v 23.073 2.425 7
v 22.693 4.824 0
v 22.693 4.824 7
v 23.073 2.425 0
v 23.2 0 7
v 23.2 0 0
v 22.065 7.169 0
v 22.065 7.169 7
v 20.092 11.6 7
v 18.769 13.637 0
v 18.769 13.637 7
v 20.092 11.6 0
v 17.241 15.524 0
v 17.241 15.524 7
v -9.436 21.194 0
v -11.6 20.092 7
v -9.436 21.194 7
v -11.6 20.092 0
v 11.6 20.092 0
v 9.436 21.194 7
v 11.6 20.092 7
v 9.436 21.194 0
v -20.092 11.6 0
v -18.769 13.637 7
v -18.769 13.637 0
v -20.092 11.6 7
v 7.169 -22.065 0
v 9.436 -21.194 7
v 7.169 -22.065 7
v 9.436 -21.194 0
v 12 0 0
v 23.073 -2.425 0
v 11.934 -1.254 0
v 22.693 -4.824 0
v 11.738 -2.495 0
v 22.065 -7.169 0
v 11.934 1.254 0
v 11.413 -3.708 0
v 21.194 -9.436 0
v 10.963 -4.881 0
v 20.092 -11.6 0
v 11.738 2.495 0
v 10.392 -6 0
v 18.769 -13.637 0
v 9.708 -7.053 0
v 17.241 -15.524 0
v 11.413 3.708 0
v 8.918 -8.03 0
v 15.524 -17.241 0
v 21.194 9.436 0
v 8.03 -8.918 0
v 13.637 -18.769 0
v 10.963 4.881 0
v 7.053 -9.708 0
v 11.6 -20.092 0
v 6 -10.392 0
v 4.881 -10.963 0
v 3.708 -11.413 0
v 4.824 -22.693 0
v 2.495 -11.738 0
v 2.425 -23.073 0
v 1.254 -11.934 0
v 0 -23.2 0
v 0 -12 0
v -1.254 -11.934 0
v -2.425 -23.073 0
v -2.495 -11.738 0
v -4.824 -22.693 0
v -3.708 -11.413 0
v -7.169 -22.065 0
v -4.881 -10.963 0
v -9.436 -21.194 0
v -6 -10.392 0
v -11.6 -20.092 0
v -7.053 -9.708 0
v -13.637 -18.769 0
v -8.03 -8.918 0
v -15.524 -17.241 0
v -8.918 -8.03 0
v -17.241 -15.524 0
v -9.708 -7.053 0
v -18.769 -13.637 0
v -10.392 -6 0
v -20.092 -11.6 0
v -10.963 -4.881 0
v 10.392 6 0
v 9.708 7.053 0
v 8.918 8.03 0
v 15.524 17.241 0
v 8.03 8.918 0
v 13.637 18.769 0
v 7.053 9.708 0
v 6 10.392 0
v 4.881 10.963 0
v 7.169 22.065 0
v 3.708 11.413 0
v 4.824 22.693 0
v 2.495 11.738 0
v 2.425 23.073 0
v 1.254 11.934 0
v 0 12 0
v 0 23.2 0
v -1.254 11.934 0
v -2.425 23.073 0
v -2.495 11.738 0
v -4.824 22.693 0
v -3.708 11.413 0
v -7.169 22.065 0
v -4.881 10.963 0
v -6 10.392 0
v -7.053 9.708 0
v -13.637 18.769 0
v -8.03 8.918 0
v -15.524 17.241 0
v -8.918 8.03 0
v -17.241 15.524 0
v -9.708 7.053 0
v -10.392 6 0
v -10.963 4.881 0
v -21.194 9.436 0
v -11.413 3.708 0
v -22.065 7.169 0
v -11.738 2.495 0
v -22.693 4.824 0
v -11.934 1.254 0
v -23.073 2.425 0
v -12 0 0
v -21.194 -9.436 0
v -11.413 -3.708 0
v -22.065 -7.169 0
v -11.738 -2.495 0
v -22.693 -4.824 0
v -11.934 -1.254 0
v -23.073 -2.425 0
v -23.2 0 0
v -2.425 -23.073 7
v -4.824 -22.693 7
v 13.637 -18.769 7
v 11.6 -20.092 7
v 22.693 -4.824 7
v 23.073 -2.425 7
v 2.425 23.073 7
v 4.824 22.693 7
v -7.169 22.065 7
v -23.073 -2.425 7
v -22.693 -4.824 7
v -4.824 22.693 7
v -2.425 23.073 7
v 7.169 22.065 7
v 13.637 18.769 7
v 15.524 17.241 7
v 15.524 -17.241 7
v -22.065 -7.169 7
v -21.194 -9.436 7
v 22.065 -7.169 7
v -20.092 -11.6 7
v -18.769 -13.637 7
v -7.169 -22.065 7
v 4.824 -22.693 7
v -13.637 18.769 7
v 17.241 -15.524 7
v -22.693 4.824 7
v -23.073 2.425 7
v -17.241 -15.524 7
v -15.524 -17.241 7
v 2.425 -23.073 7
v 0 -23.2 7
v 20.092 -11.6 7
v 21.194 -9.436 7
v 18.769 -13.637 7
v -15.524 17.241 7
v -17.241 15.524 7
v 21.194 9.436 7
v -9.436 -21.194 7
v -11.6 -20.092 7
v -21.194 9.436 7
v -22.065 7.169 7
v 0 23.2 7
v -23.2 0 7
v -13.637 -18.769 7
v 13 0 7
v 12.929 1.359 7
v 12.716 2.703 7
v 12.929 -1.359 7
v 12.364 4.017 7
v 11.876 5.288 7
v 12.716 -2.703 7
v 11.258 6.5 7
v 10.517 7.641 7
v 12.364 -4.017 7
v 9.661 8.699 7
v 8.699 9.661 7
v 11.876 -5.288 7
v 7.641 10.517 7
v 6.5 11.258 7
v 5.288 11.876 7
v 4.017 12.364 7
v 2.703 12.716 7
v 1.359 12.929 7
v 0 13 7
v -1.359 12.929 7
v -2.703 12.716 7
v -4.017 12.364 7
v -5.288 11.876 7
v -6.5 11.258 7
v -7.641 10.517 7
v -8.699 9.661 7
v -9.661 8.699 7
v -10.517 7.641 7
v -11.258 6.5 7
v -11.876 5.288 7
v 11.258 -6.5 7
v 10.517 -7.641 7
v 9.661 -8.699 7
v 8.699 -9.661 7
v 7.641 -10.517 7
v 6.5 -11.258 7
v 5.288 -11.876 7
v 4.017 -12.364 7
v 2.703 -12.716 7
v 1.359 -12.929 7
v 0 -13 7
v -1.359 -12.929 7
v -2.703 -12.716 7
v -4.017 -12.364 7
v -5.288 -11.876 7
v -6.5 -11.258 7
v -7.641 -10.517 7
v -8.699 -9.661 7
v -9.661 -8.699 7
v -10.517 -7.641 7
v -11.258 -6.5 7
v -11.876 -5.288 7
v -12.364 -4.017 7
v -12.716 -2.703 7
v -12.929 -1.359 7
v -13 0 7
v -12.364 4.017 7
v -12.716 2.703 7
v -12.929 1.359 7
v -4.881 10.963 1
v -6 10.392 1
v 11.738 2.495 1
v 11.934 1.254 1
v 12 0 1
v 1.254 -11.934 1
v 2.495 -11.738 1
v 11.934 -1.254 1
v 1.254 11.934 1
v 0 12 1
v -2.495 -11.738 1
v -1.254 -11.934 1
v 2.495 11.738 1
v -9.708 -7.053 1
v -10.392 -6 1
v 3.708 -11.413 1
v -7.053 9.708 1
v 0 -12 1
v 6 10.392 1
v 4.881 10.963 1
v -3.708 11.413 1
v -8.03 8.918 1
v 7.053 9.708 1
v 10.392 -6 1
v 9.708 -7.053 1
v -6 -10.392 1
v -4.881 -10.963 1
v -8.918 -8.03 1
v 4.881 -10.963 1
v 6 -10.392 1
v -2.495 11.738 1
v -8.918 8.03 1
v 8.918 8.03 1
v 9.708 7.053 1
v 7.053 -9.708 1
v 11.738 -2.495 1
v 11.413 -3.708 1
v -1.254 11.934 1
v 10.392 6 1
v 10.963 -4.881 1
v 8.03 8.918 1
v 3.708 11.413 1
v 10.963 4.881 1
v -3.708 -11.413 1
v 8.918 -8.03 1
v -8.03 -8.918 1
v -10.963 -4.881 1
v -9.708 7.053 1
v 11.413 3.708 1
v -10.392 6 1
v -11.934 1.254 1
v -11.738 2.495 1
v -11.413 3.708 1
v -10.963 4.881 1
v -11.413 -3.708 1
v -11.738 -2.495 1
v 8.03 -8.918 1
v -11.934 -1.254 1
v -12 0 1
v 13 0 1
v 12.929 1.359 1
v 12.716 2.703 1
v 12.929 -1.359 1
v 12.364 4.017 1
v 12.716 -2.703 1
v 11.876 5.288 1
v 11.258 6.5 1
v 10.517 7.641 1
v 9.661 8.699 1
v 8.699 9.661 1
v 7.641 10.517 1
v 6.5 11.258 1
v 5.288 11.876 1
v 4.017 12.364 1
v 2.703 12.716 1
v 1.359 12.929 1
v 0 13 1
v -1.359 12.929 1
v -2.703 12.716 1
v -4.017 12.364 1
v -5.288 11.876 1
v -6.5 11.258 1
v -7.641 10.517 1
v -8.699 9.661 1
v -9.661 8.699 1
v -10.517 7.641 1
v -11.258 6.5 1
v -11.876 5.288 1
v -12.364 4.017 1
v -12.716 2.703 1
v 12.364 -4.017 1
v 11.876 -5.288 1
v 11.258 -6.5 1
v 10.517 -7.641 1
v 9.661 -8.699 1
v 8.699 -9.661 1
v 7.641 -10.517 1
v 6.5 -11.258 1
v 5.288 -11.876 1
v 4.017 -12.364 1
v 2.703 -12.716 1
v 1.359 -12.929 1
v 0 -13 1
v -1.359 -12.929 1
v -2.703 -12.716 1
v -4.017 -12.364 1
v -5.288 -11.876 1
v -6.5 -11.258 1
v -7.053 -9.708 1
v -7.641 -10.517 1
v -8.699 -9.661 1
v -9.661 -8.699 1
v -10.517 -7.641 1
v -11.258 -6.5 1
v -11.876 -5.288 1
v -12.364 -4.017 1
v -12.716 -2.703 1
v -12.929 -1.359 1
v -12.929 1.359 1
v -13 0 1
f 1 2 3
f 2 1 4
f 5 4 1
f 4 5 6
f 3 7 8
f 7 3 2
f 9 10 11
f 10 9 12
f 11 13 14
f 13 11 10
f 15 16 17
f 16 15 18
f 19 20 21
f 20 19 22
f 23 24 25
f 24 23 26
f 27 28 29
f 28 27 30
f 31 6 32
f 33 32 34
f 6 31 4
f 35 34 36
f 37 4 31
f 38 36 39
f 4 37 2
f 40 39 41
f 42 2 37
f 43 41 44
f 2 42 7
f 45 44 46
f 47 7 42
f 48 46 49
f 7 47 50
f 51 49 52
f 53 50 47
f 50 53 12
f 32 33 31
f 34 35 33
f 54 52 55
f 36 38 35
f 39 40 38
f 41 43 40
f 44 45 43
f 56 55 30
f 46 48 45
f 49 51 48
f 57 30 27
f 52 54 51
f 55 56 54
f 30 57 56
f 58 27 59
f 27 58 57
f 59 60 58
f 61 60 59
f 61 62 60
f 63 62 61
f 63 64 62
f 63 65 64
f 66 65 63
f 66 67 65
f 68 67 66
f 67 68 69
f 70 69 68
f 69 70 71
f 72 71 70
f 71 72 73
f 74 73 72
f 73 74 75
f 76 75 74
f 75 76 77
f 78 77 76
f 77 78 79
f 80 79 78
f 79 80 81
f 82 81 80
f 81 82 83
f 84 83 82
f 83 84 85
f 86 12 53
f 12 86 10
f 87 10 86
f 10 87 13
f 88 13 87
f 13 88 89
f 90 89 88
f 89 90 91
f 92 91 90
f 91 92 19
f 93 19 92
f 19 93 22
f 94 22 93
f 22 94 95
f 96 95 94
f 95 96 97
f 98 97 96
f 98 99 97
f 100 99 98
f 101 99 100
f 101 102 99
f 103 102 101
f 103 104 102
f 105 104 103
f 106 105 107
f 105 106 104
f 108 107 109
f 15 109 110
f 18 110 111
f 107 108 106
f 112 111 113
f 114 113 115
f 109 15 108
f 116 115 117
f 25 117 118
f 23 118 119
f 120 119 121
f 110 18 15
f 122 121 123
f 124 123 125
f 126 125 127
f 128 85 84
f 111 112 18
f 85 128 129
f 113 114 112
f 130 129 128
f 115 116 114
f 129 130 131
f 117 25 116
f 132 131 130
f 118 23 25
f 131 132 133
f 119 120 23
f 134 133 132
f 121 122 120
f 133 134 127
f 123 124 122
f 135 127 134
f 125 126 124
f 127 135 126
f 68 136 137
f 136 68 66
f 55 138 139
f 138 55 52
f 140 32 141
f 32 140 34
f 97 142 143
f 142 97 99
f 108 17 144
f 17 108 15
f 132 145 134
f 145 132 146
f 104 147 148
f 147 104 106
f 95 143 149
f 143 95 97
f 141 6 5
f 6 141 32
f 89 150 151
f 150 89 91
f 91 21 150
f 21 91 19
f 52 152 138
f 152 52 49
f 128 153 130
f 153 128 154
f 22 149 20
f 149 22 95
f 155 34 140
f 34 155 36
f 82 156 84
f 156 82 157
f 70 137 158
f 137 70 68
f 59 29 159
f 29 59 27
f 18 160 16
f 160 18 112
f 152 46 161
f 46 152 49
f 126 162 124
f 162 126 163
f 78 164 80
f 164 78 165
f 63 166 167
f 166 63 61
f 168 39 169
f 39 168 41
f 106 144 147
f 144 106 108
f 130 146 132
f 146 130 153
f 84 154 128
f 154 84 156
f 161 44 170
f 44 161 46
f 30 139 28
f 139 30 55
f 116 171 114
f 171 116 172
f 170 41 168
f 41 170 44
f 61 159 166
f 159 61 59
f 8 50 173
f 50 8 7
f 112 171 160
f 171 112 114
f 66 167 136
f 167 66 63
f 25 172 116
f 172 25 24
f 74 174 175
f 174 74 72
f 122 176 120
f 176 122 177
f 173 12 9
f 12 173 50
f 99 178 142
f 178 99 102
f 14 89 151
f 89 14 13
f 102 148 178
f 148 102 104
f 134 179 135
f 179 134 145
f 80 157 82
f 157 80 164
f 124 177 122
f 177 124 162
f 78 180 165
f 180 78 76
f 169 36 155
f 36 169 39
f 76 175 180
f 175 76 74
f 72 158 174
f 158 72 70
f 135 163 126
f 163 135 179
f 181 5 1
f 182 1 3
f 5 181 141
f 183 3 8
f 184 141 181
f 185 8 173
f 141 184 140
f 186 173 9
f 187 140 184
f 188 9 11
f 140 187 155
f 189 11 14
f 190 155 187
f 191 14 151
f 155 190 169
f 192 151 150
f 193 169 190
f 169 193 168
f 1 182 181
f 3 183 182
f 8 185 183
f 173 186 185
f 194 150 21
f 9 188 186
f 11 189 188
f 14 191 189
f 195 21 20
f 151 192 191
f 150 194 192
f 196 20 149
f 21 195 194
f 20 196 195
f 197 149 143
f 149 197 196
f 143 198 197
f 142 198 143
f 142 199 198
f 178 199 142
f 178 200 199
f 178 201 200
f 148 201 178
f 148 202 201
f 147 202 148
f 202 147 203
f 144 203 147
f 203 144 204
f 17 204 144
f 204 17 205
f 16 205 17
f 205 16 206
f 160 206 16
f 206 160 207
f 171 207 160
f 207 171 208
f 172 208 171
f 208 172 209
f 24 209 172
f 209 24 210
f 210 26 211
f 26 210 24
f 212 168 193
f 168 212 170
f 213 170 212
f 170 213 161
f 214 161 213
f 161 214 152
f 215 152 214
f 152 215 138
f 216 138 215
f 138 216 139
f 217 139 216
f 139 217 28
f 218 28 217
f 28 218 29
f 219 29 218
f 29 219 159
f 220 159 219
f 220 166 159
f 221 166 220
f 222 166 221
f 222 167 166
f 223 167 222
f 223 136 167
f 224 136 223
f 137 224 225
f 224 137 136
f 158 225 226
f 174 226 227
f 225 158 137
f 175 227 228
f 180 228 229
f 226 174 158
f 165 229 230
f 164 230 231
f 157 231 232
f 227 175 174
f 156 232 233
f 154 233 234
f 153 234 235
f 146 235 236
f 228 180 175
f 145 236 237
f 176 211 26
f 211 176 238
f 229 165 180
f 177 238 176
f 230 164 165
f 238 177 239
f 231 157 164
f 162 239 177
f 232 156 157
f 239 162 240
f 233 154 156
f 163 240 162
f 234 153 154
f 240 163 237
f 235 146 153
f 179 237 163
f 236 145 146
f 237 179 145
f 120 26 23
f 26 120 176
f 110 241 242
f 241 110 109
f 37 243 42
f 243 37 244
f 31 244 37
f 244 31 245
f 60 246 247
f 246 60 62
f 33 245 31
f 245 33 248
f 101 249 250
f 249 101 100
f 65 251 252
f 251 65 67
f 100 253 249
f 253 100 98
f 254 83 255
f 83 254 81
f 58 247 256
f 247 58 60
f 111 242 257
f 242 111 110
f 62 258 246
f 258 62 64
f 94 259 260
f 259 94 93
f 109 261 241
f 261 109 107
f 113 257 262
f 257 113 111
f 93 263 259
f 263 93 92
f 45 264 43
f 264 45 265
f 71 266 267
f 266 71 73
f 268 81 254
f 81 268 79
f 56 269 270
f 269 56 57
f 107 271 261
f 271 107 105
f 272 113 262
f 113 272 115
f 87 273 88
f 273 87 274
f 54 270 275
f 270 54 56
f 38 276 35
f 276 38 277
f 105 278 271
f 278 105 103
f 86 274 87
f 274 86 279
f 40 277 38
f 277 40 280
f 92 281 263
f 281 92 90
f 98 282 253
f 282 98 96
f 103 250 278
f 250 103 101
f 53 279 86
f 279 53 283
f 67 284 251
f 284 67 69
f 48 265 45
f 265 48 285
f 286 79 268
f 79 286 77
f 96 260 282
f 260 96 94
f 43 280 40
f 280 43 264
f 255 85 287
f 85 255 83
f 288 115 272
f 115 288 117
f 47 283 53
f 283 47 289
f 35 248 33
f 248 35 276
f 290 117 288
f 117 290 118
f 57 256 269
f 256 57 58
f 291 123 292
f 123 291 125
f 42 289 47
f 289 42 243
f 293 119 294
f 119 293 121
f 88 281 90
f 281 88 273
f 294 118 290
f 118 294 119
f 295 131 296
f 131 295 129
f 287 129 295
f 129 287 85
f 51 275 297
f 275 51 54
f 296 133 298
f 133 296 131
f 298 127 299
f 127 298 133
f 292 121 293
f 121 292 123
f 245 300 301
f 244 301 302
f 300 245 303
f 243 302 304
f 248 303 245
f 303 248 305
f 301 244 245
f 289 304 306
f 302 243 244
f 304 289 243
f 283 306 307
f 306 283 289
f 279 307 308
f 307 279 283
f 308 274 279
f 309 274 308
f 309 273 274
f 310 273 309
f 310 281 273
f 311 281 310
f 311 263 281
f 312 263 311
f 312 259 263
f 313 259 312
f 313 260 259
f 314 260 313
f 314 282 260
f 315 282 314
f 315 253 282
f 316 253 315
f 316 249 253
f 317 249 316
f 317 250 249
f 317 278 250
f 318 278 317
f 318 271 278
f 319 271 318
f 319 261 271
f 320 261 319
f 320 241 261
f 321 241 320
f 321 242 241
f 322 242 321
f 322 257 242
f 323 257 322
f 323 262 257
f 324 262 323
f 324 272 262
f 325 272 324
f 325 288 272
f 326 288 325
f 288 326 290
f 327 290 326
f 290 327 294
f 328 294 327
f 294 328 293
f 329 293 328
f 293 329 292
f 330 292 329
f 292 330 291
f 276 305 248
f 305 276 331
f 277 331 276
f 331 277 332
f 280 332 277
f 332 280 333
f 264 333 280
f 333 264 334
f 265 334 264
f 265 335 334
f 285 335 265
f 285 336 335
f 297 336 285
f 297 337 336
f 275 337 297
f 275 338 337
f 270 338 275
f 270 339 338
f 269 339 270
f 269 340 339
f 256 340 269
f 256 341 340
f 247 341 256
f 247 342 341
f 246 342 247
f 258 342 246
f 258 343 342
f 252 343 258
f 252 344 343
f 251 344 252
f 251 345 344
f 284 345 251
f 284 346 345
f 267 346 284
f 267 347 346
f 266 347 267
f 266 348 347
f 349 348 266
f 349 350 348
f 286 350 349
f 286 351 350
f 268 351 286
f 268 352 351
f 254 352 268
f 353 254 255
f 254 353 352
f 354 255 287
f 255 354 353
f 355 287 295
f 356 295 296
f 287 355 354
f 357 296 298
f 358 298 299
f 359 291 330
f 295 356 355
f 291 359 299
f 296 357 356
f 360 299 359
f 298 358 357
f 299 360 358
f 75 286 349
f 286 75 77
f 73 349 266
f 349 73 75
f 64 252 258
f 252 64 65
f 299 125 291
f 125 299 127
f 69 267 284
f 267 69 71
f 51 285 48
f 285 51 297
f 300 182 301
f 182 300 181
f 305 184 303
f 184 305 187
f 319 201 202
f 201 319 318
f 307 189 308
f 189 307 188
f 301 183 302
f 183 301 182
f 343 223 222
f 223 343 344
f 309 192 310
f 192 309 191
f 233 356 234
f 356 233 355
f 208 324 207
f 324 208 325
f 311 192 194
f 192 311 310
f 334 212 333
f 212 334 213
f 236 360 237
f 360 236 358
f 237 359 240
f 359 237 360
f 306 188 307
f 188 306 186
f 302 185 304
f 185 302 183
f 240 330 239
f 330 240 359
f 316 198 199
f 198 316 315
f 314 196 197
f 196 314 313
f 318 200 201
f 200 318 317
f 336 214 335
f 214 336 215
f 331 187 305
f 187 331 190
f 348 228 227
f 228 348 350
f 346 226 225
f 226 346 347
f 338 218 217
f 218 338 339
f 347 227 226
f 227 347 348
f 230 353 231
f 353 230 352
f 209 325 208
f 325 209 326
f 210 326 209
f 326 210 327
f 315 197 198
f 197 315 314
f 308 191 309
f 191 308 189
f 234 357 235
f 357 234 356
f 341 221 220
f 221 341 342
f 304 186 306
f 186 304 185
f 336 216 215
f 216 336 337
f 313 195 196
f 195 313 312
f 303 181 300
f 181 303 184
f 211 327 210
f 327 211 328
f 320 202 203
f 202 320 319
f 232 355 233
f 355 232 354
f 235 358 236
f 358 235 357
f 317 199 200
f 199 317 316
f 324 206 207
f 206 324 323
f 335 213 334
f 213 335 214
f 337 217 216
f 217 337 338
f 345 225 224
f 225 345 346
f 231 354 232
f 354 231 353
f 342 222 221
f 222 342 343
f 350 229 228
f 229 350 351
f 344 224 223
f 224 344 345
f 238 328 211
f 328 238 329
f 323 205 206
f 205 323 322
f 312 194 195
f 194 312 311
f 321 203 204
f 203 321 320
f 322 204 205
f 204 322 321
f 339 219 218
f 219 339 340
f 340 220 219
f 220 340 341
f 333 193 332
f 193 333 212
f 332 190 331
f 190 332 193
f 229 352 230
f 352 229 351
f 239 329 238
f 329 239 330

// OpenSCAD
// Эксцентрик. Open this file, F5 preview, F6 render, export STL.
use <reference_model.scad>
$fn=60;
eccentric();
